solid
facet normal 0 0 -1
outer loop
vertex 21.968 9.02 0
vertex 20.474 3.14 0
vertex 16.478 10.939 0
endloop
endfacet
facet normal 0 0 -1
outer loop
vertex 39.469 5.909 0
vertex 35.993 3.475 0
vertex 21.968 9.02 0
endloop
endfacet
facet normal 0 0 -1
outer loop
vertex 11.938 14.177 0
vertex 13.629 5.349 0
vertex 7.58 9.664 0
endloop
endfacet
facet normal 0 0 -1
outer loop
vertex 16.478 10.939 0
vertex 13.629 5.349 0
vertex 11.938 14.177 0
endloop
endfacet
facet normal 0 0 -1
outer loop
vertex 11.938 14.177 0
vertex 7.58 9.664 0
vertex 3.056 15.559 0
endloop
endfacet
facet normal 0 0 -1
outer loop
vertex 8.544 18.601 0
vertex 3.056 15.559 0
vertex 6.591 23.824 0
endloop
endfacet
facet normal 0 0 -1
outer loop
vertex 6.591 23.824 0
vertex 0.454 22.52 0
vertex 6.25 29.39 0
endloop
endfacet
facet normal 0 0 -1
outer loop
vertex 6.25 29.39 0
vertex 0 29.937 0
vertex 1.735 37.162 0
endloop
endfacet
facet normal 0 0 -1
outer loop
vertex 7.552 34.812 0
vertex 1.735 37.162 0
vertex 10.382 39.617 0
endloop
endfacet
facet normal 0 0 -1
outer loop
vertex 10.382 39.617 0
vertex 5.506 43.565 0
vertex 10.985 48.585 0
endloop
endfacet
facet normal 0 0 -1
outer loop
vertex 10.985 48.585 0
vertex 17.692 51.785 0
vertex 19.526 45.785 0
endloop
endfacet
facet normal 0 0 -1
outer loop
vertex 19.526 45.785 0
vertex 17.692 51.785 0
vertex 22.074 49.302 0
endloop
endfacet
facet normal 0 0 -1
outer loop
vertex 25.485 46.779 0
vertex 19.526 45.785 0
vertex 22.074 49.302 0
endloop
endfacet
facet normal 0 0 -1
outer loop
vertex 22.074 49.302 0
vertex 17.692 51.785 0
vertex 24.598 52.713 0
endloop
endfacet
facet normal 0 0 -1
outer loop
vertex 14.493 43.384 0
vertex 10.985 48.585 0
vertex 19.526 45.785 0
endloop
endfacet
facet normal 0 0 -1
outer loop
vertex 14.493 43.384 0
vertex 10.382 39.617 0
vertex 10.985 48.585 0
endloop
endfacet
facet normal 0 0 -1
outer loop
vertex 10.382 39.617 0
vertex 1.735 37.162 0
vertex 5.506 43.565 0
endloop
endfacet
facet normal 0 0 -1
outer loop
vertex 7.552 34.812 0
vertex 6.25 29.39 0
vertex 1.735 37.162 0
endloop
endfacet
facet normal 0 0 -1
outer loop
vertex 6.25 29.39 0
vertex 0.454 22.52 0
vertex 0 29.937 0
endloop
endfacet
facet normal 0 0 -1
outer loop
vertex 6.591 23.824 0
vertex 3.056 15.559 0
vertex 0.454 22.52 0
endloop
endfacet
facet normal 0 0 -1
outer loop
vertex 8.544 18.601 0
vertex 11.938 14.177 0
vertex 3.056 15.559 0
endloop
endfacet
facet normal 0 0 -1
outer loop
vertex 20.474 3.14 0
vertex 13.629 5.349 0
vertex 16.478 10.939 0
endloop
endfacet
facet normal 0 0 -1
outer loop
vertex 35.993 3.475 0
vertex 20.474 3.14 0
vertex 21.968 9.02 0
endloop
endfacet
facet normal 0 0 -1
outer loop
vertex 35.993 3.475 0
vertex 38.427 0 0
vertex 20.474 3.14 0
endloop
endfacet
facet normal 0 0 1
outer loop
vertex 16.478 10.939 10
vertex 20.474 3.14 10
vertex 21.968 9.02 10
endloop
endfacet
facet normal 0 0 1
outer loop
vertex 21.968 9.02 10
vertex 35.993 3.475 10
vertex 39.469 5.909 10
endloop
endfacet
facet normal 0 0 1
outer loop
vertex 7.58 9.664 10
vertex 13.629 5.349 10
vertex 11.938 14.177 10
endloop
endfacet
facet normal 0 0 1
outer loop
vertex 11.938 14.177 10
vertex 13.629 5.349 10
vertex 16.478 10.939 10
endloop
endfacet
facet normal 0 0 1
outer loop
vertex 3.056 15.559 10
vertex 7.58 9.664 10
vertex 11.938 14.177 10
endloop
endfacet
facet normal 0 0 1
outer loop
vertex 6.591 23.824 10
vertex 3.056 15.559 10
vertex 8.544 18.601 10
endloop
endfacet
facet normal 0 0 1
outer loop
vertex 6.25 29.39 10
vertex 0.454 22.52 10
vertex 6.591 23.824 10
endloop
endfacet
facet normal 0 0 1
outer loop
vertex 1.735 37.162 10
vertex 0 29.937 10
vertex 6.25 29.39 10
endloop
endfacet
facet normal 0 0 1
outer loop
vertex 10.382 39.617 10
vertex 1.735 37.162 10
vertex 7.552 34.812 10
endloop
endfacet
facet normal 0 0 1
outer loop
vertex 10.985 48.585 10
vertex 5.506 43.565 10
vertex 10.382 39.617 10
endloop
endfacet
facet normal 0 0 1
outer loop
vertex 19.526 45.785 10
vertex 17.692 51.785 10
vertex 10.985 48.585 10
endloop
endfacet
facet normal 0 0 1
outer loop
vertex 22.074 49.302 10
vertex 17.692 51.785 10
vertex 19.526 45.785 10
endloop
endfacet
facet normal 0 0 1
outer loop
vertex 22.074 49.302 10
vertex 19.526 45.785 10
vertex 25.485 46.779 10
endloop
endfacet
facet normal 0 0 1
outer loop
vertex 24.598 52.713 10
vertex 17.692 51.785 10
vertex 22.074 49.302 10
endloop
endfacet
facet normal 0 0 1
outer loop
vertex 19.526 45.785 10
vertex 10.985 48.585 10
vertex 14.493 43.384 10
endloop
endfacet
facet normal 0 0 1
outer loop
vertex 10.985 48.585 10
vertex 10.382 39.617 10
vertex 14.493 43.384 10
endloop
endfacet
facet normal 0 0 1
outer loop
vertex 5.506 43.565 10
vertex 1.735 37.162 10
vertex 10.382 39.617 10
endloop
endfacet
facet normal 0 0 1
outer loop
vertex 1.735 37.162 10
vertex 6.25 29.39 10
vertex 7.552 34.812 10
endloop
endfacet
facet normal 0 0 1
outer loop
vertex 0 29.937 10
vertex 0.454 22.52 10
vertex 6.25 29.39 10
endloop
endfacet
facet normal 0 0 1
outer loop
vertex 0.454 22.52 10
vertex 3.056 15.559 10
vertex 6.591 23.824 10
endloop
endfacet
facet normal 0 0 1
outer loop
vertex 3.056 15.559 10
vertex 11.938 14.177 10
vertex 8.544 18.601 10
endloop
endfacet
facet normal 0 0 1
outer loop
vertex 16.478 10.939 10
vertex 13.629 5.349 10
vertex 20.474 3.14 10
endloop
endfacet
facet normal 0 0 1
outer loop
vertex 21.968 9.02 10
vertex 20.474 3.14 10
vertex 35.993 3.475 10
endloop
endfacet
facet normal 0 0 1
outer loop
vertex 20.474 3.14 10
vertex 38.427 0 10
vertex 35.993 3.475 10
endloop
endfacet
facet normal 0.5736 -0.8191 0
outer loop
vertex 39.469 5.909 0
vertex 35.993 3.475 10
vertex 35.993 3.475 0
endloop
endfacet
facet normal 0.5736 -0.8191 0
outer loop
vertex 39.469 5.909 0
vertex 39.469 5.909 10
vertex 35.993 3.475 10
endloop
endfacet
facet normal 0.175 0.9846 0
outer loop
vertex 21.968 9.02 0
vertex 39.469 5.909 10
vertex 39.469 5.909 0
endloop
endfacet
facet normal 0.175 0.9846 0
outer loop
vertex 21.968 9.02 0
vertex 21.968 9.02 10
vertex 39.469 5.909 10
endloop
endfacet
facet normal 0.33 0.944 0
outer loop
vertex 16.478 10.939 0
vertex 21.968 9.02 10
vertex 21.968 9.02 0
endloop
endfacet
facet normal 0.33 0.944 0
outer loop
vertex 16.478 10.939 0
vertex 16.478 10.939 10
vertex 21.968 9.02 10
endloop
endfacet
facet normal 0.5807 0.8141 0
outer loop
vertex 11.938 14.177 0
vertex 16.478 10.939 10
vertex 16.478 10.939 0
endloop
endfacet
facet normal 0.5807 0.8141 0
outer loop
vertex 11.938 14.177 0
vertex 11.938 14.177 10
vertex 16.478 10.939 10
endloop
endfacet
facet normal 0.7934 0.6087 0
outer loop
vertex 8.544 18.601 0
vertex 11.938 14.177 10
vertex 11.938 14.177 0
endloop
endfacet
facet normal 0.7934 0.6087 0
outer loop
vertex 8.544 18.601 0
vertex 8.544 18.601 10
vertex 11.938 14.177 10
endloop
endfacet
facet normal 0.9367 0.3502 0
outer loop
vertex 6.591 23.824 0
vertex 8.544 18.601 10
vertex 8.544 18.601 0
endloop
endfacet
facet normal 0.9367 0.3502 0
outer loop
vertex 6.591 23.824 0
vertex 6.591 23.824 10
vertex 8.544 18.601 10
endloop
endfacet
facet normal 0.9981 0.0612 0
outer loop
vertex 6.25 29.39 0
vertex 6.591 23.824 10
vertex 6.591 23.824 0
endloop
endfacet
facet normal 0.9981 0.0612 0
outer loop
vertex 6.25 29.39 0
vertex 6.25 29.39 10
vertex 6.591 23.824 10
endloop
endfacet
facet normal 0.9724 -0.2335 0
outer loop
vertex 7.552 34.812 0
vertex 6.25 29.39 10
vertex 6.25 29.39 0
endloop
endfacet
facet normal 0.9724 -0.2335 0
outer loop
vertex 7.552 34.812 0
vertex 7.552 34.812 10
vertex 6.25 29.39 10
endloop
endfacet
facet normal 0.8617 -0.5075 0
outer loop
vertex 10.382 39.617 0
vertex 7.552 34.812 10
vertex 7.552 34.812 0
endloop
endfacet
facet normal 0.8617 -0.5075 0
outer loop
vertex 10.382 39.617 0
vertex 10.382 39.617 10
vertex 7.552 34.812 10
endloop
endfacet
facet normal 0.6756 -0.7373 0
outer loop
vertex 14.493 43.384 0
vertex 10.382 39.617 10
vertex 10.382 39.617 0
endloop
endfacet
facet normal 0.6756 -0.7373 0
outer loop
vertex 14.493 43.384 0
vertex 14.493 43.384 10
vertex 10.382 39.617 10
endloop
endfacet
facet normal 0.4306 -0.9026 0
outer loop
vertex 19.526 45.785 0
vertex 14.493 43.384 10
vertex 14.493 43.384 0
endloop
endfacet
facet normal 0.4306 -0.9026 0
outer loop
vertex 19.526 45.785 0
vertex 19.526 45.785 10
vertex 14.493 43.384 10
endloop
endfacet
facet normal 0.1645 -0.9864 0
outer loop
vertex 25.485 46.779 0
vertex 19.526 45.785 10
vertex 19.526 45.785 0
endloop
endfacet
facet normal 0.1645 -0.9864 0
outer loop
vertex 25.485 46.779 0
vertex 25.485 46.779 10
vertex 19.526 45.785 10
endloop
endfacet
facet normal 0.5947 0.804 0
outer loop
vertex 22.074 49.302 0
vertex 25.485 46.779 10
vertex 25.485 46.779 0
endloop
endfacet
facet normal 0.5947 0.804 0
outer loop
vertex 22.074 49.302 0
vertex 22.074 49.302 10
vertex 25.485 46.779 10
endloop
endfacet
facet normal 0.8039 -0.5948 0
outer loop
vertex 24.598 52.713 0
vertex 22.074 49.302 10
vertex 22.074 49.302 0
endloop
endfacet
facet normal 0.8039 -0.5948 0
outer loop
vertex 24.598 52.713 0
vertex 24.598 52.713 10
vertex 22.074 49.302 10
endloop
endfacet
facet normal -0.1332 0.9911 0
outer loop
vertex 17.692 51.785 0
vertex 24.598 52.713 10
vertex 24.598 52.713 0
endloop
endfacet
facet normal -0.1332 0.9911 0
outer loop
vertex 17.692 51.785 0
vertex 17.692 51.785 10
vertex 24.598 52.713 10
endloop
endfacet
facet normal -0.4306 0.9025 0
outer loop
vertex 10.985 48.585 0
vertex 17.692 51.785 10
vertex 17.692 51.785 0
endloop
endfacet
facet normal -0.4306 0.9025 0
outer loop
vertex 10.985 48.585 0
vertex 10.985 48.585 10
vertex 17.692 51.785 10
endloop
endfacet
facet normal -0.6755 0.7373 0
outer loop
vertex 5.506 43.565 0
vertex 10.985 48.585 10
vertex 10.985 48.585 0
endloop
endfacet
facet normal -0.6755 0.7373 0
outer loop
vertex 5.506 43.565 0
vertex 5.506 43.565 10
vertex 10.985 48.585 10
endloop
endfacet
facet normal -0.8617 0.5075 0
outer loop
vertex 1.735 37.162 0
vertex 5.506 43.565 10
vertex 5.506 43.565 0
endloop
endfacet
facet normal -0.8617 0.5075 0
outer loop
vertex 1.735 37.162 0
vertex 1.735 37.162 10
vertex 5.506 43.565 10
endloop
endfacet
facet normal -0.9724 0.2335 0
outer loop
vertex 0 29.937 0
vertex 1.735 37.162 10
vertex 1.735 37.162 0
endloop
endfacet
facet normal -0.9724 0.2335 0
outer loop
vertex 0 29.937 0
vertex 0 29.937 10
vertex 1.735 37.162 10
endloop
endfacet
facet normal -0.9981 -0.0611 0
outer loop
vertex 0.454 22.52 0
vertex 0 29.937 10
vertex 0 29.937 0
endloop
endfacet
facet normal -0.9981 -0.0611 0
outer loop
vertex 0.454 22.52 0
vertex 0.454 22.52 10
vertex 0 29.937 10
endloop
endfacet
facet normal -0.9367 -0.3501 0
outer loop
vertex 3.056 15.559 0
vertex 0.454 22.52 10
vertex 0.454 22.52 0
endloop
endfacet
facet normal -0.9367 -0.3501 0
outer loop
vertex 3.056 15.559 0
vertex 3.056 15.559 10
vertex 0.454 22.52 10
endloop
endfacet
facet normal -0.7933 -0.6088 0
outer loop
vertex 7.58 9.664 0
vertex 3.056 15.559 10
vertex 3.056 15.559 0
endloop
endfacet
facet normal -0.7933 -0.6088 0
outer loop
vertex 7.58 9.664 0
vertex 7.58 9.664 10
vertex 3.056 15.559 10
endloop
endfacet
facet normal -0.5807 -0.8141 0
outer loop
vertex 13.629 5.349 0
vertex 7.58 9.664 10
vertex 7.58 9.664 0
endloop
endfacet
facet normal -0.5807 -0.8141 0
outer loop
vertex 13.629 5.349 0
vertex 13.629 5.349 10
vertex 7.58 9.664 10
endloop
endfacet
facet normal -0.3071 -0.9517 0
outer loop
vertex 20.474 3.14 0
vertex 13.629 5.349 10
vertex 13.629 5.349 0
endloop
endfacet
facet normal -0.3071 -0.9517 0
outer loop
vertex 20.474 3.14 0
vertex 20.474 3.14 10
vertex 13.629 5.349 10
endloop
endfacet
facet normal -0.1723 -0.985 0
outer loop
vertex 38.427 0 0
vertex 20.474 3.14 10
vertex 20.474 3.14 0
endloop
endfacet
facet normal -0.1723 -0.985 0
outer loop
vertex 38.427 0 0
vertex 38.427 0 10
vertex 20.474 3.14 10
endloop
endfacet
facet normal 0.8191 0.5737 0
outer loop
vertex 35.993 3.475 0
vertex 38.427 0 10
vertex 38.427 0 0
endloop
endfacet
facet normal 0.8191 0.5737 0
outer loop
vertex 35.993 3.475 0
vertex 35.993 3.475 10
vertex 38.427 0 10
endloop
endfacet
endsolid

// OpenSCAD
$fn = 32;

// ----------------------------------------------------------------------
// Hook plate: curl radius 22 mm over 170 degrees, 6 mm thick band
// ----------------------------------------------------------------------

// --- parameters (mm) ---
profile_height = 10;      // extrusion height
profile_points = 26;      // points of the closed outline

profile = [[22.074, 49.302], [24.598, 52.713], [17.692, 51.785], [10.985, 48.585], [5.506, 43.565], [1.735, 37.162], [0, 29.937], [0.454, 22.52], [3.056, 15.559], [7.58, 9.664], [13.629, 5.349], [20.474, 3.14], [38.427, 0], [35.993, 3.475], [39.469, 5.909], [21.968, 9.02], [16.478, 10.939], [11.938, 14.177], [8.544, 18.601], [6.591, 23.824], [6.25, 29.39], [7.552, 34.812], [10.382, 39.617], [14.493, 43.384], [19.526, 45.785], [25.485, 46.779]];  // single closed polygon, 26 points, counter clockwise

// --- the one profile operation ---
linear_extrude(height = profile_height) polygon(points = profile);
